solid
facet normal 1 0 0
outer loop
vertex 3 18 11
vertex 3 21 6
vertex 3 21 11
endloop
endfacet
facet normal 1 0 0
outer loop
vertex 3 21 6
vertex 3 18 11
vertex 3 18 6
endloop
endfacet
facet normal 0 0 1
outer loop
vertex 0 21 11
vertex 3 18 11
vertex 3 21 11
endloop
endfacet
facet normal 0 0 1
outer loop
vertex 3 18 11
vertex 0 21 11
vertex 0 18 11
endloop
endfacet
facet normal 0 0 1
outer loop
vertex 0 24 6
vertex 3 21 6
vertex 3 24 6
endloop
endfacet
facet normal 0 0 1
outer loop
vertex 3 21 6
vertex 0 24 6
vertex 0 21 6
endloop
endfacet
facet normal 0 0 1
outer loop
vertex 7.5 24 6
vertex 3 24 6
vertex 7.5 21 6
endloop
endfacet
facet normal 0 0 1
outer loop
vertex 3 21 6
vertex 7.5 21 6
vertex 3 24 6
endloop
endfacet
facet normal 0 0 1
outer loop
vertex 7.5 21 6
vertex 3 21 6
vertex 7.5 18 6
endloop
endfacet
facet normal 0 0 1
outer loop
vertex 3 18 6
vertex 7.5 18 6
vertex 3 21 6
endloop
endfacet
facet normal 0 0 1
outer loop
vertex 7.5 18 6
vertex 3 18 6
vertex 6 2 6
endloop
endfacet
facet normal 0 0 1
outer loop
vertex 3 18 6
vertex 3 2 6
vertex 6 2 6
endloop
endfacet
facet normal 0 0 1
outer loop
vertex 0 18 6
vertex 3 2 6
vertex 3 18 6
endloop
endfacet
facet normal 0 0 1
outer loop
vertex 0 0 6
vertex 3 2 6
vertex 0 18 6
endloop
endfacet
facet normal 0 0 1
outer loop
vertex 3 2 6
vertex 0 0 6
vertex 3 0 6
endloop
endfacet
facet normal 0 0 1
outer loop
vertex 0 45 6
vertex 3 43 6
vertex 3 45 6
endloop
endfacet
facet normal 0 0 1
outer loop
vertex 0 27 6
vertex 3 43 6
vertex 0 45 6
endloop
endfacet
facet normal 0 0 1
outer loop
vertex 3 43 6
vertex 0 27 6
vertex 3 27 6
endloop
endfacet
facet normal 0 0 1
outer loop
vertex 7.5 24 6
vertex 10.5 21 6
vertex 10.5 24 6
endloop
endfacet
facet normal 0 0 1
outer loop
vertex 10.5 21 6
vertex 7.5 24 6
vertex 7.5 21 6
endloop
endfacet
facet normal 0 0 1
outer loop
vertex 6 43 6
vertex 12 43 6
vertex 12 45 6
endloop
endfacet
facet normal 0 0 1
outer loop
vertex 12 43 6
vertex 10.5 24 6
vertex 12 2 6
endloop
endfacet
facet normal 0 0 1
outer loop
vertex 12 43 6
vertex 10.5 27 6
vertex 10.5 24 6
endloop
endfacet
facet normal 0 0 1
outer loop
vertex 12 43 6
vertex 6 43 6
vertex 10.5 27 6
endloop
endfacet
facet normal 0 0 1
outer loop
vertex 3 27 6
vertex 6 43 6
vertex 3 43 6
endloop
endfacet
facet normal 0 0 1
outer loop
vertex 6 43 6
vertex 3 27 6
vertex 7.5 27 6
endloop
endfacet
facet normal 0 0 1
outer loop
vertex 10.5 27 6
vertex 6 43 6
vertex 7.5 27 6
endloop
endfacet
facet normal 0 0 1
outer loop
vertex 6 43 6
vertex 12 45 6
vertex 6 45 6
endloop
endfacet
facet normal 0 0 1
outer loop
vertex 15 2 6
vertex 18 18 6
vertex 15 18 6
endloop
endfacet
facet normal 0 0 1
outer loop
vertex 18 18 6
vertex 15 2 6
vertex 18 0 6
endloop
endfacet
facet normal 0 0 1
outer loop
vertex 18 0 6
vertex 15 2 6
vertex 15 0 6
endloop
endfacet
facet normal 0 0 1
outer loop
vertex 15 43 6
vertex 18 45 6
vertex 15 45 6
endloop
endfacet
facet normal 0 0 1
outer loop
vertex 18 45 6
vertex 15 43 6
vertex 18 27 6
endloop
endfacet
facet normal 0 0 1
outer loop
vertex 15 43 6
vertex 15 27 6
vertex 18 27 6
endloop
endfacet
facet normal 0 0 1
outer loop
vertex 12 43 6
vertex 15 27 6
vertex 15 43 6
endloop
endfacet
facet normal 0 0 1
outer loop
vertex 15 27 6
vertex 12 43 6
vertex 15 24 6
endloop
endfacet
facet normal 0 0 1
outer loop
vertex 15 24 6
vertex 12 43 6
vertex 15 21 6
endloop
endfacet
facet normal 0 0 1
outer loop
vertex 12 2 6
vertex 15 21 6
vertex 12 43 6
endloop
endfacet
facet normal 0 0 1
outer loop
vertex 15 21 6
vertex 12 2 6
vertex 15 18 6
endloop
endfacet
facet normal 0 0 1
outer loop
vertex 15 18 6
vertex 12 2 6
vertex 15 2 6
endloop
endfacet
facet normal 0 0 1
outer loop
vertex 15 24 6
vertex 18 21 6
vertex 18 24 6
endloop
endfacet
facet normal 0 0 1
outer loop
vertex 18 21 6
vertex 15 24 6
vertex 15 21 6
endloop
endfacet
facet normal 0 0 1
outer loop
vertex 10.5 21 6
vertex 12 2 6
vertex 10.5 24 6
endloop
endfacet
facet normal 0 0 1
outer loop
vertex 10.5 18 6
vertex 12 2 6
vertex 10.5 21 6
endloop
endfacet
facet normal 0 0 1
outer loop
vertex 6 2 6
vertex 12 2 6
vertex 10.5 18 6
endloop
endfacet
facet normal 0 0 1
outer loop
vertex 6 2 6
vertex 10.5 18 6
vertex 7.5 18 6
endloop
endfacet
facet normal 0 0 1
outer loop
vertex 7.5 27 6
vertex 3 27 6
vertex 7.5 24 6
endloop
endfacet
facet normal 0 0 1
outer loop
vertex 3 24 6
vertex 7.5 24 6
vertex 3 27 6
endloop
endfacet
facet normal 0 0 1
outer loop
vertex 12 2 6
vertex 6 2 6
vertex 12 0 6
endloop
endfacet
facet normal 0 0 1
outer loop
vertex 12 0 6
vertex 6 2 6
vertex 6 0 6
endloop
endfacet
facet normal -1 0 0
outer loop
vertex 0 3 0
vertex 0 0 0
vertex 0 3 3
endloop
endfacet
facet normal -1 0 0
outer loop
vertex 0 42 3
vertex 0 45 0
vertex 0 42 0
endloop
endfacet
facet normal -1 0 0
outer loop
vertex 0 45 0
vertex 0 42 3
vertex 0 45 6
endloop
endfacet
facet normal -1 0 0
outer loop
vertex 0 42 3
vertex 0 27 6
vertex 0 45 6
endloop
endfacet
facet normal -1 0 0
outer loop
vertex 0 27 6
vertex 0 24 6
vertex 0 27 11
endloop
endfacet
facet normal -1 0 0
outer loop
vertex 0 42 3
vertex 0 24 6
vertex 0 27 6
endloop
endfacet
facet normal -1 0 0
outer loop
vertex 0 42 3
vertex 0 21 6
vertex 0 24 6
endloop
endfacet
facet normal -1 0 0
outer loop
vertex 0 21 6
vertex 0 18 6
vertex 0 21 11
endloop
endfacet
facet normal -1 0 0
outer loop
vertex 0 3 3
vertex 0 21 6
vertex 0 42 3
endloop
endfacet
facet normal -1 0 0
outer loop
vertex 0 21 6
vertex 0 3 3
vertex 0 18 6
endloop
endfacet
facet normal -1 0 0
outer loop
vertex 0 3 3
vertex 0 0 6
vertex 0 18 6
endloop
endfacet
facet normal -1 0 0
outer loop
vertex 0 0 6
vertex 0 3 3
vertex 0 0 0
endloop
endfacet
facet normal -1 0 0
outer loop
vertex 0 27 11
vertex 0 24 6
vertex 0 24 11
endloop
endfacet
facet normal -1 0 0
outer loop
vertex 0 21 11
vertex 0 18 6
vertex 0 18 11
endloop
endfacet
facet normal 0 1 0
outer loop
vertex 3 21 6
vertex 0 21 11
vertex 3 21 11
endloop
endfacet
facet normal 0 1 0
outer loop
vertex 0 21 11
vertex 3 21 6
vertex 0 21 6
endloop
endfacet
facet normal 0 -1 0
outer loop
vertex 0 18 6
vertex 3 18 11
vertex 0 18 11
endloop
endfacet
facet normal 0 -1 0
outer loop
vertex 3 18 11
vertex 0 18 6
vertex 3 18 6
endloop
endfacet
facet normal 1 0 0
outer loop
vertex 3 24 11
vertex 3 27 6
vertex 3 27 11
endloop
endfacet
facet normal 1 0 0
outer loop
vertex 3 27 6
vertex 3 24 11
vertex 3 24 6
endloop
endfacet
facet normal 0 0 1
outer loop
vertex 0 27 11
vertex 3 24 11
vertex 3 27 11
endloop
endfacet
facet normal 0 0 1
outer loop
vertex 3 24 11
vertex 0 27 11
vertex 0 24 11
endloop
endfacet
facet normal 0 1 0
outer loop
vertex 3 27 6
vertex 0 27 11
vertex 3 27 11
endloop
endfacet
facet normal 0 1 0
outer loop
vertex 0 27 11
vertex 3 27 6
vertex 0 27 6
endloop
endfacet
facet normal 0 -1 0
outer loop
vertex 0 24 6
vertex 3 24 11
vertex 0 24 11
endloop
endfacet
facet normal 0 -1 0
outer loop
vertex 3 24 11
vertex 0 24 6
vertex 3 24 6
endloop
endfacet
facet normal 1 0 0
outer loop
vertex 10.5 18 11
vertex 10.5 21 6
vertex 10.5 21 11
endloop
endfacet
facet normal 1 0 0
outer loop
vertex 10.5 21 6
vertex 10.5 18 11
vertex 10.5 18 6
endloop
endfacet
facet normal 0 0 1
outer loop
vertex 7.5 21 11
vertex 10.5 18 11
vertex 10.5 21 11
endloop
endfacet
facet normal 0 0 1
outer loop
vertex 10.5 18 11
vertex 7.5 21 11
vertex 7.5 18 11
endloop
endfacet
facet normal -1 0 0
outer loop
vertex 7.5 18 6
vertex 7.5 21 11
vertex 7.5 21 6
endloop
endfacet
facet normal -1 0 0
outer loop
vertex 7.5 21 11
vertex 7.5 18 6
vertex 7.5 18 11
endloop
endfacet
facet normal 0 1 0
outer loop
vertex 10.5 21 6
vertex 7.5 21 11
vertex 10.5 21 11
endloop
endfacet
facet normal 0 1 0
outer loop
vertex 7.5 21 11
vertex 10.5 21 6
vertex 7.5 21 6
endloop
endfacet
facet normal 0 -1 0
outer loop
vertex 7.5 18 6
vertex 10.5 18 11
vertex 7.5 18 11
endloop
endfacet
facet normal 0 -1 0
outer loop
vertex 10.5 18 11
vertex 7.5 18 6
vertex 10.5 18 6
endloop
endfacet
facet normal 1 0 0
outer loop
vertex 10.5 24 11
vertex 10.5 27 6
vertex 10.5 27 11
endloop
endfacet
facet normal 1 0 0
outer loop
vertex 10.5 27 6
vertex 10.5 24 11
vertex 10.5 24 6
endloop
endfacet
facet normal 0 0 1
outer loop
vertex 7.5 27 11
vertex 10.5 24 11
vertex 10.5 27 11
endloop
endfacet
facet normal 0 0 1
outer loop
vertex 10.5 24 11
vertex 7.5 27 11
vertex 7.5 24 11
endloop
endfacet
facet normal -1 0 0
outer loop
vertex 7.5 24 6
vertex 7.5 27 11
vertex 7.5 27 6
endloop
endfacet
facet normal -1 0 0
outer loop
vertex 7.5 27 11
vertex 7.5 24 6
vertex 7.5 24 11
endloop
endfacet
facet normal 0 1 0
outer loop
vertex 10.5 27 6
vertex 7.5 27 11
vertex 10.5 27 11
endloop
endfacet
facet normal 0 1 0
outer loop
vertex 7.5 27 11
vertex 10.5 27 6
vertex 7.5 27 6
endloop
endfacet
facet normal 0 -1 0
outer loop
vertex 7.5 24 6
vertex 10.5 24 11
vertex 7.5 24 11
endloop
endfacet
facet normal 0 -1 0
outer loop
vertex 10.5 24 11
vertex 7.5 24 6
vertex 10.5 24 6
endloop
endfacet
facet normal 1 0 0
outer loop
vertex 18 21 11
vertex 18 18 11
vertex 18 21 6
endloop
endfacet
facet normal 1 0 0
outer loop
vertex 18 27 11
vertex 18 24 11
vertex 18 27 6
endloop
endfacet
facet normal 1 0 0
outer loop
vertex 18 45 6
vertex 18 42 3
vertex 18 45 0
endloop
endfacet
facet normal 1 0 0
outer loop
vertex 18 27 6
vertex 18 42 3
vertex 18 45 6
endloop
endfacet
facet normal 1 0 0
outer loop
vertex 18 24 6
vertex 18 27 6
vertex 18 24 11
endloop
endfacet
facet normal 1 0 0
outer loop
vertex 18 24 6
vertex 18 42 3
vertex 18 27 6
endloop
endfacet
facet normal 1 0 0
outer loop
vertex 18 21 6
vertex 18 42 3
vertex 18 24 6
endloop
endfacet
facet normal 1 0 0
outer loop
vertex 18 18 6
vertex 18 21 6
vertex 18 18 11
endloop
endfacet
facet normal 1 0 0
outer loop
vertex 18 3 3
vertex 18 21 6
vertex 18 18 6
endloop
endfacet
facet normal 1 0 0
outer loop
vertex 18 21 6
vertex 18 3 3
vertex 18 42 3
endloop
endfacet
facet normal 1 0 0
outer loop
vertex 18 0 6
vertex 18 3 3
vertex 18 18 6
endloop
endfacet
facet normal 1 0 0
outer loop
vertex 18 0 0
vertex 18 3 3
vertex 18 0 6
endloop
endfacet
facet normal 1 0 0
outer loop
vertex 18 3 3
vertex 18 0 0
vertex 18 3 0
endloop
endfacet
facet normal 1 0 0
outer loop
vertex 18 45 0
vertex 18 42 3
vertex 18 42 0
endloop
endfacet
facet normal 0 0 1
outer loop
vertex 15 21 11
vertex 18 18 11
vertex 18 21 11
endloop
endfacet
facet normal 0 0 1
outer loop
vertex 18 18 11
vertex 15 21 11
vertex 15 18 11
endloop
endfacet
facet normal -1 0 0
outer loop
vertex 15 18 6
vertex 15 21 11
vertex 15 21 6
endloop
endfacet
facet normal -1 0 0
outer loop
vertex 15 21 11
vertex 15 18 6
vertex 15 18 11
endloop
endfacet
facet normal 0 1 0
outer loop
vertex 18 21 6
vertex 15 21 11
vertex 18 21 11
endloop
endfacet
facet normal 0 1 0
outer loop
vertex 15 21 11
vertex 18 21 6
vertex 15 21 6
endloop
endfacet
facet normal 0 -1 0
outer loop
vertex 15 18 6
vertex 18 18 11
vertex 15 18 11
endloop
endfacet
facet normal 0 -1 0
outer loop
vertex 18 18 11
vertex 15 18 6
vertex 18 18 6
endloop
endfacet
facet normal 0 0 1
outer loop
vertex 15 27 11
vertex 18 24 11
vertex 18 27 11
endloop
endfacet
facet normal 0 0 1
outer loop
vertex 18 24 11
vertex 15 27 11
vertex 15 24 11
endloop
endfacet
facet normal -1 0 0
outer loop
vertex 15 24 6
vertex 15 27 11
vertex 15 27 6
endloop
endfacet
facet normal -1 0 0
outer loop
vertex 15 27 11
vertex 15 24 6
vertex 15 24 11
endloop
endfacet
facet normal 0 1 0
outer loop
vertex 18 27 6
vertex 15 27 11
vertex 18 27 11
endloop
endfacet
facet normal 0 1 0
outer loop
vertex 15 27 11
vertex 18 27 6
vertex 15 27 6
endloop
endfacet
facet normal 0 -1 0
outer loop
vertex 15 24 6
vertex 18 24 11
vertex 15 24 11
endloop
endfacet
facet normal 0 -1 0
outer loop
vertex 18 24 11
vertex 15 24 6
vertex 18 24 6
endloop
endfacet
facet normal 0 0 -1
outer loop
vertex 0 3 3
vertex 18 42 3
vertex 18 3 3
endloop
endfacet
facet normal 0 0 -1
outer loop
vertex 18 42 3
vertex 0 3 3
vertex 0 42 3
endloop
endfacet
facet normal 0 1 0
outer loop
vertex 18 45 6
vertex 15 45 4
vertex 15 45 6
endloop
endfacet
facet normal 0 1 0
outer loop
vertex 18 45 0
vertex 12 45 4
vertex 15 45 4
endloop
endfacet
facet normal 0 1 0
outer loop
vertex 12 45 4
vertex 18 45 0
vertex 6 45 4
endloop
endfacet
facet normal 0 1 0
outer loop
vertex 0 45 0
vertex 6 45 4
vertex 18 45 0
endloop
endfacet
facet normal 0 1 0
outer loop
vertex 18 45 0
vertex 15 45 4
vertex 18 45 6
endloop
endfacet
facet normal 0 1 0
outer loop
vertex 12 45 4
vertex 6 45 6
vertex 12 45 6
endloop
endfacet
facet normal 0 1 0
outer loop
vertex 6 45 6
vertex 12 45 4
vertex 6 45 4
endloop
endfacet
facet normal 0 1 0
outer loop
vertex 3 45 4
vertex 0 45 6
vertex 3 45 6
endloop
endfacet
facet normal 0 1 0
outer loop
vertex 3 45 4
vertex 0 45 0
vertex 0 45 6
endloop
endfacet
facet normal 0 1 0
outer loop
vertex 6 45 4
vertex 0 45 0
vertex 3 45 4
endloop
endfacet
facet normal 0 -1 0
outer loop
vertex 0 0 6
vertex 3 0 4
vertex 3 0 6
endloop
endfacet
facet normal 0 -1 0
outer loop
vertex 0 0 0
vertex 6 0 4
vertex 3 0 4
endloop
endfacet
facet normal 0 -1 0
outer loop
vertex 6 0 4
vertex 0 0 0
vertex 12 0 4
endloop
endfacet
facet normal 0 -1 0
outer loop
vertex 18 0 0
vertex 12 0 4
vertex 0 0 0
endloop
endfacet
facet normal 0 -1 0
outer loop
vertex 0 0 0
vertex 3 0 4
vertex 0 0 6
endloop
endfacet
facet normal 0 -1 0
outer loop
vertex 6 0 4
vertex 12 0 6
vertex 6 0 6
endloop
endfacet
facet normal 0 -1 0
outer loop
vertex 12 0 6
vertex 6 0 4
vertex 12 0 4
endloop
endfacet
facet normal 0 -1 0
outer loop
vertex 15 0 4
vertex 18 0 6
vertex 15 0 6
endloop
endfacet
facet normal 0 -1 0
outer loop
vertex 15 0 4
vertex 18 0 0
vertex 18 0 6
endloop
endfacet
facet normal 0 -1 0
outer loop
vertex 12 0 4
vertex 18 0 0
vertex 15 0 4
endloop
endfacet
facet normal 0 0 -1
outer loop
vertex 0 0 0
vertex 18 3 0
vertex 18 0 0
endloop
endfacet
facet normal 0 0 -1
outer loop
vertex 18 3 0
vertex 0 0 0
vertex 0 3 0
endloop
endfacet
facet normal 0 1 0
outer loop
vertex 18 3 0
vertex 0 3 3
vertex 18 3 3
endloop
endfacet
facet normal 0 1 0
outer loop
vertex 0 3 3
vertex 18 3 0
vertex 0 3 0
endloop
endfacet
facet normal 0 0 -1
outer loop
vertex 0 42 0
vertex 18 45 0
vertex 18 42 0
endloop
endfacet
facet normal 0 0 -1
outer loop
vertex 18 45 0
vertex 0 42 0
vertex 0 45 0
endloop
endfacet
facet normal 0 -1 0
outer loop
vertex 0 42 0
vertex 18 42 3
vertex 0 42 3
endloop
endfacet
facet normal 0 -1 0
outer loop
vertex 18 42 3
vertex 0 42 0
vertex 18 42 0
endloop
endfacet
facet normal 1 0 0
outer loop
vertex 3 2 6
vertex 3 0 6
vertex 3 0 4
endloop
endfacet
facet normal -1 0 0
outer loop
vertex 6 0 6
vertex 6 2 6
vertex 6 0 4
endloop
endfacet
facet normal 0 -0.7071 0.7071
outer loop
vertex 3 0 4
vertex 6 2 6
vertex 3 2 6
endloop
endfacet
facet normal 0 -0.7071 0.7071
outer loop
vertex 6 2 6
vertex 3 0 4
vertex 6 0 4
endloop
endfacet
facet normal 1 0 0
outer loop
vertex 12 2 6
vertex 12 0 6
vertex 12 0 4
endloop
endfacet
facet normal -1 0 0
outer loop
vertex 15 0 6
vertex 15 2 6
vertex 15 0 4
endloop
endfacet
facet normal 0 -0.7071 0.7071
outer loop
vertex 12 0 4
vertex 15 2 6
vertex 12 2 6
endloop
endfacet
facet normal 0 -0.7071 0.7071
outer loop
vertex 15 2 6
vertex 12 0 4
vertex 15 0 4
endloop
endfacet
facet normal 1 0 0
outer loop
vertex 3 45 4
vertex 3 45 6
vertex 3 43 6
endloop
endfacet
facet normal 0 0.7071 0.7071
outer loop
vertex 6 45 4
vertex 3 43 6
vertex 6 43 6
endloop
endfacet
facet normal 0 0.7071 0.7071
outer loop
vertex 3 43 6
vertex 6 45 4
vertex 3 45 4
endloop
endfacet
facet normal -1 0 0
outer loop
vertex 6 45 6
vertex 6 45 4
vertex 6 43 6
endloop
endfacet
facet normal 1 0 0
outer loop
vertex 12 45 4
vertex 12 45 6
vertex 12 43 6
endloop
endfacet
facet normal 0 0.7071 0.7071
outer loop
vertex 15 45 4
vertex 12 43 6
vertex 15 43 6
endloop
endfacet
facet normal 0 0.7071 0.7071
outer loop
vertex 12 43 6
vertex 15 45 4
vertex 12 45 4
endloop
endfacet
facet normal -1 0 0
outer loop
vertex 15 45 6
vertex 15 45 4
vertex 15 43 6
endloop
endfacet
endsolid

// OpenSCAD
// --- CONFIG
num_teeth = 3;
pillar_width = 39;
// --- END

width = pillar_width + 3*2;
length = 3 + (3+4.5) * (num_teeth-1);

difference() {
  union() {
    translate([0, 0, 3]) cube([length, width, 3]);
    translate([0, 0, 0]) cube([length, 3, 3]);
    translate([0, pillar_width+3, 0]) cube([length, 3, 3]);

    for (i = [1:num_teeth]) translate([7.5*(i-1), 0, 6]) teeth();
  }
  translate([3, 0, 0]) rut();
  translate([length-6, 0, 0]) rut();
  translate([3, width, 0]) rut();
  translate([length-6, width, 0]) rut();
}


module teeth() {
  translate([0, (width-9)/2, 0]) cube([3, 3, 5]);
  translate([0, (width-9)/2+6, 0]) cube([3, 3, 5]);
}

module rut() {
  translate([0, 0, 4]) rotate([45, 0, 0]) cube(3);
}
